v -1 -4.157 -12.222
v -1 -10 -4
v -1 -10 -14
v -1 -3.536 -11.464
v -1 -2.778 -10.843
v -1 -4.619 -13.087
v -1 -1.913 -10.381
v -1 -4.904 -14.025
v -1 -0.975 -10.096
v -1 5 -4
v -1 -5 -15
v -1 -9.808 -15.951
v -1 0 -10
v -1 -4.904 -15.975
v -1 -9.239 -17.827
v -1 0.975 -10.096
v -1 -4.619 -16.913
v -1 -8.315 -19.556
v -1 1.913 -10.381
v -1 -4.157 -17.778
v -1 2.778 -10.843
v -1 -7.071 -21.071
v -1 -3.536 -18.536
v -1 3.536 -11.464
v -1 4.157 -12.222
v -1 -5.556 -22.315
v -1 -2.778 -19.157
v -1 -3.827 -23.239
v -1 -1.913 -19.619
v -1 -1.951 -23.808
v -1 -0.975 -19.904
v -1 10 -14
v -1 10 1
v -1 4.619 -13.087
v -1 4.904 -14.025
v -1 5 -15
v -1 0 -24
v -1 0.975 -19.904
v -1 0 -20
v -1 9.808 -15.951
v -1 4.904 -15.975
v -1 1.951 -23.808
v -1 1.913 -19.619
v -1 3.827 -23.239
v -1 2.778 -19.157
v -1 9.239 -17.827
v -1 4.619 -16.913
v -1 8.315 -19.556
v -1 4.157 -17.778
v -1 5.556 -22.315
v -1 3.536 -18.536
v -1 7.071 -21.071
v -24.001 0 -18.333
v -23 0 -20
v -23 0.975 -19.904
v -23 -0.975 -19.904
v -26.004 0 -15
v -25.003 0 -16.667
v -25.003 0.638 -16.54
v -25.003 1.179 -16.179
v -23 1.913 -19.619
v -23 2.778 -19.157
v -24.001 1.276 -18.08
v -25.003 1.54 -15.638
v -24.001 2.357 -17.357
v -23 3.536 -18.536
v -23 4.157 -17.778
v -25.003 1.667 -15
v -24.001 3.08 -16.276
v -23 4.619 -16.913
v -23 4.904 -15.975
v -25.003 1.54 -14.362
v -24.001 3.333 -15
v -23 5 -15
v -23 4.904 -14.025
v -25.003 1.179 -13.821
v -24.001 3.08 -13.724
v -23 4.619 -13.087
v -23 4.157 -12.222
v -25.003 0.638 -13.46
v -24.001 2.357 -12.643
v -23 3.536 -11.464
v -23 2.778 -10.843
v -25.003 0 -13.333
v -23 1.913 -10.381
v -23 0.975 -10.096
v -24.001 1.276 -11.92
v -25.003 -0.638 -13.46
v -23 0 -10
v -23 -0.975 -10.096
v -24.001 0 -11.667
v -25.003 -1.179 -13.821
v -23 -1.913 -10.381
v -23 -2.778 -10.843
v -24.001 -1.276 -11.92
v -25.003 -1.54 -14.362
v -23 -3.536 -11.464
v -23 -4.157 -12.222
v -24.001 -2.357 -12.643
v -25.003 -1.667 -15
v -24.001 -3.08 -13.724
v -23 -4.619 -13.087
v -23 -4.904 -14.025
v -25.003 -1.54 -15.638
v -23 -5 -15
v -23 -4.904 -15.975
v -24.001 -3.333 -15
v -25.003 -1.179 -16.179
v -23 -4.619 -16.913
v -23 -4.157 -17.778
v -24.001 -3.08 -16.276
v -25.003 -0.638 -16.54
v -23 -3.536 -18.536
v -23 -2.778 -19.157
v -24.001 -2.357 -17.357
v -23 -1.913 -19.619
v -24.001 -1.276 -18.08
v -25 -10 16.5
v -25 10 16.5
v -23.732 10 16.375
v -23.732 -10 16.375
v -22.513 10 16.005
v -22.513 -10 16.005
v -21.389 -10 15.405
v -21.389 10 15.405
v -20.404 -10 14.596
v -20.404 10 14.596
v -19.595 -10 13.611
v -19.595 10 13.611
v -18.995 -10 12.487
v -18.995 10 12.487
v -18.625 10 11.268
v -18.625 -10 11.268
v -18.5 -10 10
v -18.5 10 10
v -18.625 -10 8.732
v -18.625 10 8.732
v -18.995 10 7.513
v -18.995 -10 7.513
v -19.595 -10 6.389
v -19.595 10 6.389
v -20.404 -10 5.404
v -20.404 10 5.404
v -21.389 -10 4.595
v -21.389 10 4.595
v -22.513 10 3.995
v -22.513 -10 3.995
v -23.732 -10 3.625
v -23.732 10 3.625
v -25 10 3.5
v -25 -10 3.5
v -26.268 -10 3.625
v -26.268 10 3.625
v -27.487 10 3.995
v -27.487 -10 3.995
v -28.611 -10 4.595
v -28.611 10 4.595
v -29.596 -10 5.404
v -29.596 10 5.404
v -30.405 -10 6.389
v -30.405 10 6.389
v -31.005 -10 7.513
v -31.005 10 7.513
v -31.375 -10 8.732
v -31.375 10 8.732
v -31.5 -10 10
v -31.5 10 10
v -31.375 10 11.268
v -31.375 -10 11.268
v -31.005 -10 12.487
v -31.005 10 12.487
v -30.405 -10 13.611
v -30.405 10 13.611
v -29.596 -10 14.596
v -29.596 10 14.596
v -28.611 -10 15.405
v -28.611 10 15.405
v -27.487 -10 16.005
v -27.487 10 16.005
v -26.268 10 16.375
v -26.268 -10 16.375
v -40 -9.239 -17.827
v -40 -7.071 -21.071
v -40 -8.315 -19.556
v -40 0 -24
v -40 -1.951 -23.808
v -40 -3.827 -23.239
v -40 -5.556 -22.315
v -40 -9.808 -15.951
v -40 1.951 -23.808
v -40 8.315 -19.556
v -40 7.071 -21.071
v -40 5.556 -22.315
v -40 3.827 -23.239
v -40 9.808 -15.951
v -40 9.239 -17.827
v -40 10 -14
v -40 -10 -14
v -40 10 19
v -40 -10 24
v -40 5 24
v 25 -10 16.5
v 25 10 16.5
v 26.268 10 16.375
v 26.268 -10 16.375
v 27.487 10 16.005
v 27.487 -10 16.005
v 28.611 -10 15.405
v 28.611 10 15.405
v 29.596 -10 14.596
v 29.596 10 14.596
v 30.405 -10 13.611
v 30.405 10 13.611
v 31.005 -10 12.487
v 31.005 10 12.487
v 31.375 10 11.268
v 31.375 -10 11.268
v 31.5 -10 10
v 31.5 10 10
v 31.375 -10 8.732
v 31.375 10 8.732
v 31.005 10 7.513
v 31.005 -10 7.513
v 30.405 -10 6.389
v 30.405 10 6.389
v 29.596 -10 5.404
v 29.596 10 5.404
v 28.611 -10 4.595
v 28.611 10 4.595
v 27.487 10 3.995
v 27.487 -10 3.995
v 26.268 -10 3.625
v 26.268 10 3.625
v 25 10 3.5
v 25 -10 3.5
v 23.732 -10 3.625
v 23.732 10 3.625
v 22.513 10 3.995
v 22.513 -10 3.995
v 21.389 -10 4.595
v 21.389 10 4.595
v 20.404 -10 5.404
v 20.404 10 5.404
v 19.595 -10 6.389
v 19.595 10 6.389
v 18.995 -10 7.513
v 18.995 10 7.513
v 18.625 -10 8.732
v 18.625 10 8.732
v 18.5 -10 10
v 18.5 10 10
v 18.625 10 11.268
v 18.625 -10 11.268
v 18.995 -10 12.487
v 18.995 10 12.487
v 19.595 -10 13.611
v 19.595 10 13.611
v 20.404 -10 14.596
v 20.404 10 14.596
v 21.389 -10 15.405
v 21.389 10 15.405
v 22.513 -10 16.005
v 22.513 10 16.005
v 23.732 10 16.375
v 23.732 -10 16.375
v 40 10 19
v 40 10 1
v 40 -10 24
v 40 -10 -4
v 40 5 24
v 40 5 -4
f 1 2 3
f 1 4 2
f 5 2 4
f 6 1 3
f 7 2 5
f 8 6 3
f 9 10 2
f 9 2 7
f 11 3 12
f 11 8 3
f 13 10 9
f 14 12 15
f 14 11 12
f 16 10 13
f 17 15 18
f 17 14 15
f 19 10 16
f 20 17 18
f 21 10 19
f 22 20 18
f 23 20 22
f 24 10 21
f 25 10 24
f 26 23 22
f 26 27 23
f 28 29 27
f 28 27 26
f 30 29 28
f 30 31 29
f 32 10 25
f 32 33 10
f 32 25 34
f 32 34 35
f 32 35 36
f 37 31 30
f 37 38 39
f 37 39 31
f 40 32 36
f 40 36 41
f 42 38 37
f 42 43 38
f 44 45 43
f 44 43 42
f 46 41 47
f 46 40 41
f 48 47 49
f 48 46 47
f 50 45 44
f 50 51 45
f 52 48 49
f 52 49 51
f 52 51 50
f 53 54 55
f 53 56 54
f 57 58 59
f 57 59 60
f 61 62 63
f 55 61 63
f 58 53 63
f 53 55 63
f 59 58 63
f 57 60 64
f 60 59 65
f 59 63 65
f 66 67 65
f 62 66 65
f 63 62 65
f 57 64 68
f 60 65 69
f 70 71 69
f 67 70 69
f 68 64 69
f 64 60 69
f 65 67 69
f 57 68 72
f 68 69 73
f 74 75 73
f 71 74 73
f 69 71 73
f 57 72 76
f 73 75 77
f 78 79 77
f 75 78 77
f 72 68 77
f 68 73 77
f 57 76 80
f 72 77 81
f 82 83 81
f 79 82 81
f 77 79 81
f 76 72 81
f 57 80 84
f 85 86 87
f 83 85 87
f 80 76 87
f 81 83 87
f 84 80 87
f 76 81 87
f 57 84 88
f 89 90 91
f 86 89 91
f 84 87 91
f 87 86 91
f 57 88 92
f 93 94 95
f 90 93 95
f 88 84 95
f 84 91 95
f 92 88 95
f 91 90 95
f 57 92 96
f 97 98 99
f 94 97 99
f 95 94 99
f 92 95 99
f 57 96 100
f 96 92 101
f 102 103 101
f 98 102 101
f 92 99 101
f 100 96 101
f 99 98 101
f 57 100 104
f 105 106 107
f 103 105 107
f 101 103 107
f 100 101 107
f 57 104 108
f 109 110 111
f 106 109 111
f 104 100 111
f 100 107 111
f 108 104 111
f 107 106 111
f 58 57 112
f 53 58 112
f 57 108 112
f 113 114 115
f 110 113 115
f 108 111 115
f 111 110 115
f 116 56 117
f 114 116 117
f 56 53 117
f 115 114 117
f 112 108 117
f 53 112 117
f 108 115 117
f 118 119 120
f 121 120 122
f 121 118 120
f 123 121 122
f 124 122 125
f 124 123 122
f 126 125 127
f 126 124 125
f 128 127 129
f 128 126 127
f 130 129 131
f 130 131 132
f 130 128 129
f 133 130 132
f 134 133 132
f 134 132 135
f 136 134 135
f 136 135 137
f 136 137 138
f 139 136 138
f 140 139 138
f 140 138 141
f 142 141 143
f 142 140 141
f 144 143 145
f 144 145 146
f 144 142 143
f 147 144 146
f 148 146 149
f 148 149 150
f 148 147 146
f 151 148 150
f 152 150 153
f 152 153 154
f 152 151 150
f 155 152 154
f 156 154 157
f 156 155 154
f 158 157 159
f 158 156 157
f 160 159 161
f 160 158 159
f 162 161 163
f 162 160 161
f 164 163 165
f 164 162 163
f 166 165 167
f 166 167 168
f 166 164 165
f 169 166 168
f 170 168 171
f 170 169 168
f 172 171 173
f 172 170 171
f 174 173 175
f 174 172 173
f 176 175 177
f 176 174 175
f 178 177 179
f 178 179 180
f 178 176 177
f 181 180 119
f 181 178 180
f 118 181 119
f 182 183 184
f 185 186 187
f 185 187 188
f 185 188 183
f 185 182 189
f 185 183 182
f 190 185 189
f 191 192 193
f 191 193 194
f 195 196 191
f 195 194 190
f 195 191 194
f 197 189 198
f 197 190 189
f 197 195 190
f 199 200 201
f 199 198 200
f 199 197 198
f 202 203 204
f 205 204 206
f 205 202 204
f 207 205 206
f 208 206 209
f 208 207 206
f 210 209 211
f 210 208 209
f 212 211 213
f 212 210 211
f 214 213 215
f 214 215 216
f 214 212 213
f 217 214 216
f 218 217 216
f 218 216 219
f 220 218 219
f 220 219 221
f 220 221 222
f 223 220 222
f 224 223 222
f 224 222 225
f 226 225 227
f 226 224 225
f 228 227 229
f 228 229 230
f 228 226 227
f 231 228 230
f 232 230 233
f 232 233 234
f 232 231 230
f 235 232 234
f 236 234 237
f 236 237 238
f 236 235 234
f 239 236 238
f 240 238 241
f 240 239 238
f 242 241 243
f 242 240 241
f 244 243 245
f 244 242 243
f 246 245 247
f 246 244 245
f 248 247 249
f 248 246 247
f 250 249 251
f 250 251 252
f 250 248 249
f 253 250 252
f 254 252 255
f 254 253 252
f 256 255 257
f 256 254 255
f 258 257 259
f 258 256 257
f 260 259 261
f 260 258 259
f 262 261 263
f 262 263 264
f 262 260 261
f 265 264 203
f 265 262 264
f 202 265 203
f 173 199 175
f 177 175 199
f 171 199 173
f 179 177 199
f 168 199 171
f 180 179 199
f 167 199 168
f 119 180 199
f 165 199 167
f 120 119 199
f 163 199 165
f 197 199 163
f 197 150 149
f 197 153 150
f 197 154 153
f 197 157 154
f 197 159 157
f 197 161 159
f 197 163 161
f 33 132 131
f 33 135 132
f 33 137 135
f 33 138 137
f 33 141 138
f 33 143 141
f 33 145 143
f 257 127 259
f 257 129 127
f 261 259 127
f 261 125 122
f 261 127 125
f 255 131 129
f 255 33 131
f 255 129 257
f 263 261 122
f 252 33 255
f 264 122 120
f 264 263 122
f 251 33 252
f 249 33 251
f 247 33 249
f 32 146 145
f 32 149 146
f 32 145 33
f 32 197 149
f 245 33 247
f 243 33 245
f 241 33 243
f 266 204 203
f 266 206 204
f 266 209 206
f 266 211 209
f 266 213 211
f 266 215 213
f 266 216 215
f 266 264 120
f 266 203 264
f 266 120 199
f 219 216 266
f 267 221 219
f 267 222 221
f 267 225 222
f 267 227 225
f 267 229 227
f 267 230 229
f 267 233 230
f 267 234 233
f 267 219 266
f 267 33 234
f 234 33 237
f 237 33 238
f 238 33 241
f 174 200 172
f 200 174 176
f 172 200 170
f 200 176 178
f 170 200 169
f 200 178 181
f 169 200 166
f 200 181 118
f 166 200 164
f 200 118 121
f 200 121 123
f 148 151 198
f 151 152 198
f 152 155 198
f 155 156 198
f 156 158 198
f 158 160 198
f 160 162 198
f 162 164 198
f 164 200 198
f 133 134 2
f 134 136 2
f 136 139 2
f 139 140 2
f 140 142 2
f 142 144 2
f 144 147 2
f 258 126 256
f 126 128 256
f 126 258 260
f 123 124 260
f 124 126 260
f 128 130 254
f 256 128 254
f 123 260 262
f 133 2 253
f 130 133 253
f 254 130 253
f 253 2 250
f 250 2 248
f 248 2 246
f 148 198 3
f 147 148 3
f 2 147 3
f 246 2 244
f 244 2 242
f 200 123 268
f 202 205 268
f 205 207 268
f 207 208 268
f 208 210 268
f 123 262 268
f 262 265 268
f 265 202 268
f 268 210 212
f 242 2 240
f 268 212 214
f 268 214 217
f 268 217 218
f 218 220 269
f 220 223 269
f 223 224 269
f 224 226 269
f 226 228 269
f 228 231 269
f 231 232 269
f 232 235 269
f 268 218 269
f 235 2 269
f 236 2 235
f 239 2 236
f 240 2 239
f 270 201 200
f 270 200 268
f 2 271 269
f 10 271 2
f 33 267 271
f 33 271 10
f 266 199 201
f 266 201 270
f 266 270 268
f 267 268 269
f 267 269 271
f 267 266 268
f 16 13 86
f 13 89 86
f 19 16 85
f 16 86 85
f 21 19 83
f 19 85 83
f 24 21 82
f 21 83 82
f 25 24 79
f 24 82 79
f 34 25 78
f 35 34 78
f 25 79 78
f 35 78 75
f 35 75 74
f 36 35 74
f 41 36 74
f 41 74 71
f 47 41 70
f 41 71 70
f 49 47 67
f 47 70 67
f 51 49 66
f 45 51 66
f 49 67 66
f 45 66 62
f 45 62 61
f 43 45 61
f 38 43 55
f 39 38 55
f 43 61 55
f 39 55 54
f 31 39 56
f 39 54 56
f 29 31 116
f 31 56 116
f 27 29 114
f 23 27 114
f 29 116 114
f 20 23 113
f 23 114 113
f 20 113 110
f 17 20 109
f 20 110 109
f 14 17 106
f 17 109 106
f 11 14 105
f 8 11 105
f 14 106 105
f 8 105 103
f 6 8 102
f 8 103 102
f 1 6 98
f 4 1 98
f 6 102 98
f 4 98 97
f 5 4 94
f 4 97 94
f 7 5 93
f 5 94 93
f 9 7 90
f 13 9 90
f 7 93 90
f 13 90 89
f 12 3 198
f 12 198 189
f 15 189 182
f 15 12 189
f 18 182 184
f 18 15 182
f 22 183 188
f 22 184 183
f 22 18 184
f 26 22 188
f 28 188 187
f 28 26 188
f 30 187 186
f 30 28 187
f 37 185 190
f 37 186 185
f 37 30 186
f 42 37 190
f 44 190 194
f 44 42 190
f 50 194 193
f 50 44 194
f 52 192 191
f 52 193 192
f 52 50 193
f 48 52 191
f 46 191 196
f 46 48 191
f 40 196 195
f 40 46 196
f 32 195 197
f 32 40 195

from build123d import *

# Parameters (mm, degrees)
SKIZZE1_R                       = 6.5
AUFSATZ_LINEAR_AUSTRAGEN1_DEPTH = 10
F_10_0MM_STIFTLOCH1_D           = 10
F_10_0MM_STIFTLOCH1_DEPTH       = 22
F_10_0MM_STIFTLOCH1_TIP         = 3.004303095
SCHNITT_LINEAR_AUSTRAGEN2_DEPTH = 49.548944376
FASE1_SIZE                      = 5


with BuildPart() as part:
    # Skizze1 → Aufsatz-Linear austragen1 (new, symmetric)
    with BuildSketch(Plane(origin=(0, 0, 0), x_dir=(1, 0, 0), z_dir=(0, 1, 0))):
        Polygon((-40, -24), (40, -24), (40, 4), (-1, 4), (-1, 24), (-40, 24), align=None)
        with Locations(Location((-25, -10, 0), (0, 0, 270))):
            Circle(SKIZZE1_R, mode=Mode.SUBTRACT)
        with Locations(Location((25, -10, 0), (0, 0, 270))):
            Circle(SKIZZE1_R, mode=Mode.SUBTRACT)
    extrude(amount=AUFSATZ_LINEAR_AUSTRAGEN1_DEPTH, both=True)

    # Ø10.0mm Stiftloch1
    with Locations(Plane(origin=(-1, 0, 0), x_dir=(0, 0, -1), z_dir=(1, 0, 0))):
        with Locations((15, 0)):
            Hole(F_10_0MM_STIFTLOCH1_D / 2, depth=F_10_0MM_STIFTLOCH1_DEPTH)
            with Locations((0, 0, -(F_10_0MM_STIFTLOCH1_DEPTH + F_10_0MM_STIFTLOCH1_TIP / 2))):  # 118° drill point
                Cone(0, F_10_0MM_STIFTLOCH1_D / 2, F_10_0MM_STIFTLOCH1_TIP, mode=Mode.SUBTRACT)

    # Skizze5 → Schnitt-Linear austragen2 (cut, through all)
    with BuildSketch(Plane(origin=(-1, 0, 0), x_dir=(0, 0, -1), z_dir=(1, 0, 0))):
        with BuildLine():
            Line((14, 10), (26, 10))
            Line((26, 10), (26, -10))
            Line((26, -10), (14, -10))
            ThreePointArc((14, -10), (24, 0), (14, 10))
        make_face()
    extrude(amount=-SCHNITT_LINEAR_AUSTRAGEN2_DEPTH, mode=Mode.SUBTRACT)

    # Fase1
    fase1_edges = [part.edges().sort_by_distance(p)[0] for p in [
        (19.5, 10, -4),
        (0, 10, 24),
    ]]
    chamfer(fase1_edges, length=FASE1_SIZE)


solid = part.part
